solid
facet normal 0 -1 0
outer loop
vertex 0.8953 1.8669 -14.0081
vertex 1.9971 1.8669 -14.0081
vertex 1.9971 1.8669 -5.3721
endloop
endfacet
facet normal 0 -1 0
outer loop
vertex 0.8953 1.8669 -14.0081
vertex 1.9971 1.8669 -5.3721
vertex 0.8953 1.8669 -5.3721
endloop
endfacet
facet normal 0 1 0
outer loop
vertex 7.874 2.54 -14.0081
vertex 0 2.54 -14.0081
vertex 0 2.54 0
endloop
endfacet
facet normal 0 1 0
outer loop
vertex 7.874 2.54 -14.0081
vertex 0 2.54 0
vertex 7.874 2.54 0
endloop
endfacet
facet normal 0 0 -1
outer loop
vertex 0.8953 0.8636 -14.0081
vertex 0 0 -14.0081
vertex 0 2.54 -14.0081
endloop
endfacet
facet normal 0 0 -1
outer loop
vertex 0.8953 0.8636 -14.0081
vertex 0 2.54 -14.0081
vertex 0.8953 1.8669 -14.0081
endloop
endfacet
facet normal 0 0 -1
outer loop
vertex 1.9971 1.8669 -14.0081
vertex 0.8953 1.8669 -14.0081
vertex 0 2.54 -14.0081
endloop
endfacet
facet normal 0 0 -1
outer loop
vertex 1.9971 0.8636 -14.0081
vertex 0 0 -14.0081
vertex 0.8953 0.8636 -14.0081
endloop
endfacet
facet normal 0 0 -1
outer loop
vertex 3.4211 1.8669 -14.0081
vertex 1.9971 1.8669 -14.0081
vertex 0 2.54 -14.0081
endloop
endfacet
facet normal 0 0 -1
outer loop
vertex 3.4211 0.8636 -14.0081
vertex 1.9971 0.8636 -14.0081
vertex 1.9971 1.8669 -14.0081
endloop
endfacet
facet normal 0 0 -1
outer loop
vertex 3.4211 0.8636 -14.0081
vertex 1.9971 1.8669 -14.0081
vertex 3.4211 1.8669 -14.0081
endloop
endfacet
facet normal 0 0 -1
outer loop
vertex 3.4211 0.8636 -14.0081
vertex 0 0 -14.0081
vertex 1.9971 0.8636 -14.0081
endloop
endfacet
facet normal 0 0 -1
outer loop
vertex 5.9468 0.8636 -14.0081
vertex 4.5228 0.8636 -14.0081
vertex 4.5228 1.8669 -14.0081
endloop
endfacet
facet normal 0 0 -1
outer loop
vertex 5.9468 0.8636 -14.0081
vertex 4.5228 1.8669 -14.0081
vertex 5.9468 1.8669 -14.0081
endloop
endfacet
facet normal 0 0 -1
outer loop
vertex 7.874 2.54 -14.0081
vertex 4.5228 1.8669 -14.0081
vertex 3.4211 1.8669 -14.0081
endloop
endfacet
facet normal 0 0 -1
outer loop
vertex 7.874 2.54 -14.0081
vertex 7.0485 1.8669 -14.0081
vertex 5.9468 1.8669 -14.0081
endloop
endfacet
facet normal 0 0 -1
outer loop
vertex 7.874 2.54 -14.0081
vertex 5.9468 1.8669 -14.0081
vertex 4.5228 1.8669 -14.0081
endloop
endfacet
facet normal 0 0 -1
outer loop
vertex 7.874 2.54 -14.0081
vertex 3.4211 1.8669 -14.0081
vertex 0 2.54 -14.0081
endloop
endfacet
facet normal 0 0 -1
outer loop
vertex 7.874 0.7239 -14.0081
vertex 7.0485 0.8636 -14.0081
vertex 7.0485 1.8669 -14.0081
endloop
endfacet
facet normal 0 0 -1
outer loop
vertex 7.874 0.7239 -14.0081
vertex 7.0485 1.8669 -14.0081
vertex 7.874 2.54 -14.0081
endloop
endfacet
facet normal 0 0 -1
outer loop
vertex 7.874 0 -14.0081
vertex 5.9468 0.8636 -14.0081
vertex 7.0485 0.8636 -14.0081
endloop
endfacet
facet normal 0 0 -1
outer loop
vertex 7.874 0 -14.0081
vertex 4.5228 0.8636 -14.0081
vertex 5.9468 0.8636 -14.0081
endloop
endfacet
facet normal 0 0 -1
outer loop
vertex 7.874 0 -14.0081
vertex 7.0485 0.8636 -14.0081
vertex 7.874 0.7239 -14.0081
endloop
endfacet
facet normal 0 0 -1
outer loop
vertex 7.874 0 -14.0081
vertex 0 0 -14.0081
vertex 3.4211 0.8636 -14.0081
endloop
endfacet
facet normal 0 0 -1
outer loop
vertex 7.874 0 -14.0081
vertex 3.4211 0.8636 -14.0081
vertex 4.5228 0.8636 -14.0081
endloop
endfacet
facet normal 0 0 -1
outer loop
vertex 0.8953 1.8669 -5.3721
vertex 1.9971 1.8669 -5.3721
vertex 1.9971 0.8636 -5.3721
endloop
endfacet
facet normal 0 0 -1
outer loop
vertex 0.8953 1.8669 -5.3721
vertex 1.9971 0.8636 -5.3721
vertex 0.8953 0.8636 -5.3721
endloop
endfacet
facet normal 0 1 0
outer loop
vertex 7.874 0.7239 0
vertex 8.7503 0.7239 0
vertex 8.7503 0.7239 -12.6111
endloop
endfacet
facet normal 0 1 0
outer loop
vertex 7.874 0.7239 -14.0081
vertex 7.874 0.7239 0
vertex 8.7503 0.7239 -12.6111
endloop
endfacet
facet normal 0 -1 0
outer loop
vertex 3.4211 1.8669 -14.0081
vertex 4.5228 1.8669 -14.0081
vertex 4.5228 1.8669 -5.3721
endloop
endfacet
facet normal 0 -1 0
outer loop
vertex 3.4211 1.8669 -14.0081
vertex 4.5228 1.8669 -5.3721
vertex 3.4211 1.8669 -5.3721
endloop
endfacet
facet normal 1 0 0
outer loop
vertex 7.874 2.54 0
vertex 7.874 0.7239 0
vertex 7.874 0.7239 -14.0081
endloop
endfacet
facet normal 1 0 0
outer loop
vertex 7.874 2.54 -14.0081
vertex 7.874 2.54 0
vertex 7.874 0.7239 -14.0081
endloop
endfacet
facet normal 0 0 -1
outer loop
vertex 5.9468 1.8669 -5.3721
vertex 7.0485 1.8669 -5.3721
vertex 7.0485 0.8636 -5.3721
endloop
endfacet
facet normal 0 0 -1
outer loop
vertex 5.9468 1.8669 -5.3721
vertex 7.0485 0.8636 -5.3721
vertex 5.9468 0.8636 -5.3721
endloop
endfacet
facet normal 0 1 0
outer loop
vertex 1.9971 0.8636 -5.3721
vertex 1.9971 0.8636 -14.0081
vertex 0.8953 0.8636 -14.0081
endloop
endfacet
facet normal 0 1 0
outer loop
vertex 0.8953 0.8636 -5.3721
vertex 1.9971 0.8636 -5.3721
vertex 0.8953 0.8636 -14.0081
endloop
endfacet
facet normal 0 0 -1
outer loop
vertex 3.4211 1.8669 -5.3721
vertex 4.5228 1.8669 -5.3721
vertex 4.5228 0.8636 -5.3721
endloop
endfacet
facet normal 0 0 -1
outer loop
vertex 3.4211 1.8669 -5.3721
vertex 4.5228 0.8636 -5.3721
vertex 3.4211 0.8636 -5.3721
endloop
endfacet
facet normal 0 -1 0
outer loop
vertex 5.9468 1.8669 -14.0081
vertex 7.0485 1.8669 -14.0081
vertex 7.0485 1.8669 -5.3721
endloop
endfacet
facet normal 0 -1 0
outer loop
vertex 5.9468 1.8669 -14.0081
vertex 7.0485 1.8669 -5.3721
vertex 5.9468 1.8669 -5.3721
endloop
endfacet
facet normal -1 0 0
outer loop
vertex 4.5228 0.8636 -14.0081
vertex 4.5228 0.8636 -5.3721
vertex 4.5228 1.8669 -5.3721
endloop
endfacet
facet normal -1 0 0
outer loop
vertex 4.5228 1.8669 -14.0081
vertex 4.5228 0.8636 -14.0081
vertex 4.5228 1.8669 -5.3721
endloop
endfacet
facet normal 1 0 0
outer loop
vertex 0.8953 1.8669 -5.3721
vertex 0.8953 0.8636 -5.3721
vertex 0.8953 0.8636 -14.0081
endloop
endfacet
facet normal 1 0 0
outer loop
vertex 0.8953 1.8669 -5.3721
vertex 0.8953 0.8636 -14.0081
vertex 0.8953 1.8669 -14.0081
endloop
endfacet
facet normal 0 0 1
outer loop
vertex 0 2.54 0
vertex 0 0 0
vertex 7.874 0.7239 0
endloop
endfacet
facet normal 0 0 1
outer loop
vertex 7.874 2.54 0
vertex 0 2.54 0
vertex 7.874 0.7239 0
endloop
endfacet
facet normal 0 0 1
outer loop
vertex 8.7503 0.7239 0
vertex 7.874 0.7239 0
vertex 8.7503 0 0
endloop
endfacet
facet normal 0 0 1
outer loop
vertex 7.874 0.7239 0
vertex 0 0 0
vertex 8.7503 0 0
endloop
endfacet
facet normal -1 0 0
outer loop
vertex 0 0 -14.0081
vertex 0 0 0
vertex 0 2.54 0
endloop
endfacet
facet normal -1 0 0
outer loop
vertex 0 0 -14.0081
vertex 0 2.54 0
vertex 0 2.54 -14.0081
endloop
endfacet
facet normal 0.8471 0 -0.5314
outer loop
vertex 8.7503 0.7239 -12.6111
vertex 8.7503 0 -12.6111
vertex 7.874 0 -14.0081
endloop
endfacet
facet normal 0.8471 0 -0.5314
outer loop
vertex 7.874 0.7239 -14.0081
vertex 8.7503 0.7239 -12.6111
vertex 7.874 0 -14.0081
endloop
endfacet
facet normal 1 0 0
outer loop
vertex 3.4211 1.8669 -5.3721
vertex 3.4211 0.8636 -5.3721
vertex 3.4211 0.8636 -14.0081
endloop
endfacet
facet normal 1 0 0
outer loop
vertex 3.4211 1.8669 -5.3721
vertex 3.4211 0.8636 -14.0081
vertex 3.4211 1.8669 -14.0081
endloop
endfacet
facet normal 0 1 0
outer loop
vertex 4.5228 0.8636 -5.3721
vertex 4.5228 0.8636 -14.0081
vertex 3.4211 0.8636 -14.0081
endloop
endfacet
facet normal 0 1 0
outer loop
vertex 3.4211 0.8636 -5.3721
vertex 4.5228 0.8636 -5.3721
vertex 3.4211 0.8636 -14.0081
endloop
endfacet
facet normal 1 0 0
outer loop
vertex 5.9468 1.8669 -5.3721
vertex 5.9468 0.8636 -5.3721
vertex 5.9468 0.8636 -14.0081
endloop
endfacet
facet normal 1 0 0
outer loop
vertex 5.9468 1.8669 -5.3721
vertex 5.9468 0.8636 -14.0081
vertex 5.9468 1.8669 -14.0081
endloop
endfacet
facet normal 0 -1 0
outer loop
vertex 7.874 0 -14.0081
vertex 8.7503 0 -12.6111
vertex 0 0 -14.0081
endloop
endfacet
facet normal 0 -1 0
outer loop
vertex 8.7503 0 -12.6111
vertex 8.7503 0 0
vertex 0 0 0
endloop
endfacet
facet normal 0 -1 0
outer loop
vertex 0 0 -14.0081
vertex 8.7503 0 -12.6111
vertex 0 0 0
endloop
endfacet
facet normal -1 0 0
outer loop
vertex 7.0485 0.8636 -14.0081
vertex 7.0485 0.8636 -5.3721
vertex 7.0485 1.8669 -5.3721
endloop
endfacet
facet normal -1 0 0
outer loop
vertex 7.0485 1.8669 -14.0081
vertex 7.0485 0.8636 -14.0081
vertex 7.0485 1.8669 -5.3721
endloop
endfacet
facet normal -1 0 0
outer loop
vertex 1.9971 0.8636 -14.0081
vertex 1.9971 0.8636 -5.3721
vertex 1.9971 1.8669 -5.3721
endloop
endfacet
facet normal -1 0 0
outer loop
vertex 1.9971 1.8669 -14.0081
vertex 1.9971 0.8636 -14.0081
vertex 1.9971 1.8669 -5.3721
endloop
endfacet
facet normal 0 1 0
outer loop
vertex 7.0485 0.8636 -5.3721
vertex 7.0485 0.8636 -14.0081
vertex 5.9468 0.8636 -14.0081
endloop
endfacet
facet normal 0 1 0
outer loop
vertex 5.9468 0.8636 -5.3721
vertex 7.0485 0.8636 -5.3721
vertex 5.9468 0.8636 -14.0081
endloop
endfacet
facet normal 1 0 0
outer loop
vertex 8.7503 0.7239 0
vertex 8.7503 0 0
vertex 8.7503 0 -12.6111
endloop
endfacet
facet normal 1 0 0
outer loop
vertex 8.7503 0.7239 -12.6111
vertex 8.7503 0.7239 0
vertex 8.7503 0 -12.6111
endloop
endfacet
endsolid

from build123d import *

# Parameters (mm, degrees)
SKETCH1_W           = 7.874
SKETCH1_H           = 14.0081
BOSS_EXTRUDE1_DEPTH = 2.54
SKETCH2_W           = 1.101725
SKETCH2_H           = 1.0033
CUT_EXTRUDE1_DEPTH  = 8.636
BOSS_EXTRUDE3_DEPTH = 0.7239


with BuildPart() as part:
    # Sketch1 → Boss-Extrude1 (new body)
    with BuildSketch(Plane(origin=(0, 0, 0), x_dir=(1, 0, 0), z_dir=(0, 1, 0))):
        with Locations((3.937, 7.00405)):
            Rectangle(SKETCH1_W, SKETCH1_H)
    extrude(amount=BOSS_EXTRUDE1_DEPTH)

    # Sketch2 → Cut-Extrude1 (cut)
    with BuildSketch(Plane(origin=(0, 0, -14.0081), x_dir=(-1, 0, 0), z_dir=(0, 0, -1))):
        with Locations((-6.4976375, 1.36525)):
            Rectangle(SKETCH2_W, SKETCH2_H)
        with Locations((-3.971925, 1.36525)):
            Rectangle(SKETCH2_W, SKETCH2_H)
        with Locations((-1.4462125, 1.36525)):
            Rectangle(SKETCH2_W, SKETCH2_H)
    extrude(amount=-CUT_EXTRUDE1_DEPTH, mode=Mode.SUBTRACT)

    # Sketch5 → Boss-Extrude3 (add)
    with BuildSketch(Plane.XZ):
        Polygon((7.874, -14.0081), (7.874, 0), (8.7503, 0), (8.7503, -12.6111), align=None)
    extrude(amount=-BOSS_EXTRUDE3_DEPTH)


solid = part.part
